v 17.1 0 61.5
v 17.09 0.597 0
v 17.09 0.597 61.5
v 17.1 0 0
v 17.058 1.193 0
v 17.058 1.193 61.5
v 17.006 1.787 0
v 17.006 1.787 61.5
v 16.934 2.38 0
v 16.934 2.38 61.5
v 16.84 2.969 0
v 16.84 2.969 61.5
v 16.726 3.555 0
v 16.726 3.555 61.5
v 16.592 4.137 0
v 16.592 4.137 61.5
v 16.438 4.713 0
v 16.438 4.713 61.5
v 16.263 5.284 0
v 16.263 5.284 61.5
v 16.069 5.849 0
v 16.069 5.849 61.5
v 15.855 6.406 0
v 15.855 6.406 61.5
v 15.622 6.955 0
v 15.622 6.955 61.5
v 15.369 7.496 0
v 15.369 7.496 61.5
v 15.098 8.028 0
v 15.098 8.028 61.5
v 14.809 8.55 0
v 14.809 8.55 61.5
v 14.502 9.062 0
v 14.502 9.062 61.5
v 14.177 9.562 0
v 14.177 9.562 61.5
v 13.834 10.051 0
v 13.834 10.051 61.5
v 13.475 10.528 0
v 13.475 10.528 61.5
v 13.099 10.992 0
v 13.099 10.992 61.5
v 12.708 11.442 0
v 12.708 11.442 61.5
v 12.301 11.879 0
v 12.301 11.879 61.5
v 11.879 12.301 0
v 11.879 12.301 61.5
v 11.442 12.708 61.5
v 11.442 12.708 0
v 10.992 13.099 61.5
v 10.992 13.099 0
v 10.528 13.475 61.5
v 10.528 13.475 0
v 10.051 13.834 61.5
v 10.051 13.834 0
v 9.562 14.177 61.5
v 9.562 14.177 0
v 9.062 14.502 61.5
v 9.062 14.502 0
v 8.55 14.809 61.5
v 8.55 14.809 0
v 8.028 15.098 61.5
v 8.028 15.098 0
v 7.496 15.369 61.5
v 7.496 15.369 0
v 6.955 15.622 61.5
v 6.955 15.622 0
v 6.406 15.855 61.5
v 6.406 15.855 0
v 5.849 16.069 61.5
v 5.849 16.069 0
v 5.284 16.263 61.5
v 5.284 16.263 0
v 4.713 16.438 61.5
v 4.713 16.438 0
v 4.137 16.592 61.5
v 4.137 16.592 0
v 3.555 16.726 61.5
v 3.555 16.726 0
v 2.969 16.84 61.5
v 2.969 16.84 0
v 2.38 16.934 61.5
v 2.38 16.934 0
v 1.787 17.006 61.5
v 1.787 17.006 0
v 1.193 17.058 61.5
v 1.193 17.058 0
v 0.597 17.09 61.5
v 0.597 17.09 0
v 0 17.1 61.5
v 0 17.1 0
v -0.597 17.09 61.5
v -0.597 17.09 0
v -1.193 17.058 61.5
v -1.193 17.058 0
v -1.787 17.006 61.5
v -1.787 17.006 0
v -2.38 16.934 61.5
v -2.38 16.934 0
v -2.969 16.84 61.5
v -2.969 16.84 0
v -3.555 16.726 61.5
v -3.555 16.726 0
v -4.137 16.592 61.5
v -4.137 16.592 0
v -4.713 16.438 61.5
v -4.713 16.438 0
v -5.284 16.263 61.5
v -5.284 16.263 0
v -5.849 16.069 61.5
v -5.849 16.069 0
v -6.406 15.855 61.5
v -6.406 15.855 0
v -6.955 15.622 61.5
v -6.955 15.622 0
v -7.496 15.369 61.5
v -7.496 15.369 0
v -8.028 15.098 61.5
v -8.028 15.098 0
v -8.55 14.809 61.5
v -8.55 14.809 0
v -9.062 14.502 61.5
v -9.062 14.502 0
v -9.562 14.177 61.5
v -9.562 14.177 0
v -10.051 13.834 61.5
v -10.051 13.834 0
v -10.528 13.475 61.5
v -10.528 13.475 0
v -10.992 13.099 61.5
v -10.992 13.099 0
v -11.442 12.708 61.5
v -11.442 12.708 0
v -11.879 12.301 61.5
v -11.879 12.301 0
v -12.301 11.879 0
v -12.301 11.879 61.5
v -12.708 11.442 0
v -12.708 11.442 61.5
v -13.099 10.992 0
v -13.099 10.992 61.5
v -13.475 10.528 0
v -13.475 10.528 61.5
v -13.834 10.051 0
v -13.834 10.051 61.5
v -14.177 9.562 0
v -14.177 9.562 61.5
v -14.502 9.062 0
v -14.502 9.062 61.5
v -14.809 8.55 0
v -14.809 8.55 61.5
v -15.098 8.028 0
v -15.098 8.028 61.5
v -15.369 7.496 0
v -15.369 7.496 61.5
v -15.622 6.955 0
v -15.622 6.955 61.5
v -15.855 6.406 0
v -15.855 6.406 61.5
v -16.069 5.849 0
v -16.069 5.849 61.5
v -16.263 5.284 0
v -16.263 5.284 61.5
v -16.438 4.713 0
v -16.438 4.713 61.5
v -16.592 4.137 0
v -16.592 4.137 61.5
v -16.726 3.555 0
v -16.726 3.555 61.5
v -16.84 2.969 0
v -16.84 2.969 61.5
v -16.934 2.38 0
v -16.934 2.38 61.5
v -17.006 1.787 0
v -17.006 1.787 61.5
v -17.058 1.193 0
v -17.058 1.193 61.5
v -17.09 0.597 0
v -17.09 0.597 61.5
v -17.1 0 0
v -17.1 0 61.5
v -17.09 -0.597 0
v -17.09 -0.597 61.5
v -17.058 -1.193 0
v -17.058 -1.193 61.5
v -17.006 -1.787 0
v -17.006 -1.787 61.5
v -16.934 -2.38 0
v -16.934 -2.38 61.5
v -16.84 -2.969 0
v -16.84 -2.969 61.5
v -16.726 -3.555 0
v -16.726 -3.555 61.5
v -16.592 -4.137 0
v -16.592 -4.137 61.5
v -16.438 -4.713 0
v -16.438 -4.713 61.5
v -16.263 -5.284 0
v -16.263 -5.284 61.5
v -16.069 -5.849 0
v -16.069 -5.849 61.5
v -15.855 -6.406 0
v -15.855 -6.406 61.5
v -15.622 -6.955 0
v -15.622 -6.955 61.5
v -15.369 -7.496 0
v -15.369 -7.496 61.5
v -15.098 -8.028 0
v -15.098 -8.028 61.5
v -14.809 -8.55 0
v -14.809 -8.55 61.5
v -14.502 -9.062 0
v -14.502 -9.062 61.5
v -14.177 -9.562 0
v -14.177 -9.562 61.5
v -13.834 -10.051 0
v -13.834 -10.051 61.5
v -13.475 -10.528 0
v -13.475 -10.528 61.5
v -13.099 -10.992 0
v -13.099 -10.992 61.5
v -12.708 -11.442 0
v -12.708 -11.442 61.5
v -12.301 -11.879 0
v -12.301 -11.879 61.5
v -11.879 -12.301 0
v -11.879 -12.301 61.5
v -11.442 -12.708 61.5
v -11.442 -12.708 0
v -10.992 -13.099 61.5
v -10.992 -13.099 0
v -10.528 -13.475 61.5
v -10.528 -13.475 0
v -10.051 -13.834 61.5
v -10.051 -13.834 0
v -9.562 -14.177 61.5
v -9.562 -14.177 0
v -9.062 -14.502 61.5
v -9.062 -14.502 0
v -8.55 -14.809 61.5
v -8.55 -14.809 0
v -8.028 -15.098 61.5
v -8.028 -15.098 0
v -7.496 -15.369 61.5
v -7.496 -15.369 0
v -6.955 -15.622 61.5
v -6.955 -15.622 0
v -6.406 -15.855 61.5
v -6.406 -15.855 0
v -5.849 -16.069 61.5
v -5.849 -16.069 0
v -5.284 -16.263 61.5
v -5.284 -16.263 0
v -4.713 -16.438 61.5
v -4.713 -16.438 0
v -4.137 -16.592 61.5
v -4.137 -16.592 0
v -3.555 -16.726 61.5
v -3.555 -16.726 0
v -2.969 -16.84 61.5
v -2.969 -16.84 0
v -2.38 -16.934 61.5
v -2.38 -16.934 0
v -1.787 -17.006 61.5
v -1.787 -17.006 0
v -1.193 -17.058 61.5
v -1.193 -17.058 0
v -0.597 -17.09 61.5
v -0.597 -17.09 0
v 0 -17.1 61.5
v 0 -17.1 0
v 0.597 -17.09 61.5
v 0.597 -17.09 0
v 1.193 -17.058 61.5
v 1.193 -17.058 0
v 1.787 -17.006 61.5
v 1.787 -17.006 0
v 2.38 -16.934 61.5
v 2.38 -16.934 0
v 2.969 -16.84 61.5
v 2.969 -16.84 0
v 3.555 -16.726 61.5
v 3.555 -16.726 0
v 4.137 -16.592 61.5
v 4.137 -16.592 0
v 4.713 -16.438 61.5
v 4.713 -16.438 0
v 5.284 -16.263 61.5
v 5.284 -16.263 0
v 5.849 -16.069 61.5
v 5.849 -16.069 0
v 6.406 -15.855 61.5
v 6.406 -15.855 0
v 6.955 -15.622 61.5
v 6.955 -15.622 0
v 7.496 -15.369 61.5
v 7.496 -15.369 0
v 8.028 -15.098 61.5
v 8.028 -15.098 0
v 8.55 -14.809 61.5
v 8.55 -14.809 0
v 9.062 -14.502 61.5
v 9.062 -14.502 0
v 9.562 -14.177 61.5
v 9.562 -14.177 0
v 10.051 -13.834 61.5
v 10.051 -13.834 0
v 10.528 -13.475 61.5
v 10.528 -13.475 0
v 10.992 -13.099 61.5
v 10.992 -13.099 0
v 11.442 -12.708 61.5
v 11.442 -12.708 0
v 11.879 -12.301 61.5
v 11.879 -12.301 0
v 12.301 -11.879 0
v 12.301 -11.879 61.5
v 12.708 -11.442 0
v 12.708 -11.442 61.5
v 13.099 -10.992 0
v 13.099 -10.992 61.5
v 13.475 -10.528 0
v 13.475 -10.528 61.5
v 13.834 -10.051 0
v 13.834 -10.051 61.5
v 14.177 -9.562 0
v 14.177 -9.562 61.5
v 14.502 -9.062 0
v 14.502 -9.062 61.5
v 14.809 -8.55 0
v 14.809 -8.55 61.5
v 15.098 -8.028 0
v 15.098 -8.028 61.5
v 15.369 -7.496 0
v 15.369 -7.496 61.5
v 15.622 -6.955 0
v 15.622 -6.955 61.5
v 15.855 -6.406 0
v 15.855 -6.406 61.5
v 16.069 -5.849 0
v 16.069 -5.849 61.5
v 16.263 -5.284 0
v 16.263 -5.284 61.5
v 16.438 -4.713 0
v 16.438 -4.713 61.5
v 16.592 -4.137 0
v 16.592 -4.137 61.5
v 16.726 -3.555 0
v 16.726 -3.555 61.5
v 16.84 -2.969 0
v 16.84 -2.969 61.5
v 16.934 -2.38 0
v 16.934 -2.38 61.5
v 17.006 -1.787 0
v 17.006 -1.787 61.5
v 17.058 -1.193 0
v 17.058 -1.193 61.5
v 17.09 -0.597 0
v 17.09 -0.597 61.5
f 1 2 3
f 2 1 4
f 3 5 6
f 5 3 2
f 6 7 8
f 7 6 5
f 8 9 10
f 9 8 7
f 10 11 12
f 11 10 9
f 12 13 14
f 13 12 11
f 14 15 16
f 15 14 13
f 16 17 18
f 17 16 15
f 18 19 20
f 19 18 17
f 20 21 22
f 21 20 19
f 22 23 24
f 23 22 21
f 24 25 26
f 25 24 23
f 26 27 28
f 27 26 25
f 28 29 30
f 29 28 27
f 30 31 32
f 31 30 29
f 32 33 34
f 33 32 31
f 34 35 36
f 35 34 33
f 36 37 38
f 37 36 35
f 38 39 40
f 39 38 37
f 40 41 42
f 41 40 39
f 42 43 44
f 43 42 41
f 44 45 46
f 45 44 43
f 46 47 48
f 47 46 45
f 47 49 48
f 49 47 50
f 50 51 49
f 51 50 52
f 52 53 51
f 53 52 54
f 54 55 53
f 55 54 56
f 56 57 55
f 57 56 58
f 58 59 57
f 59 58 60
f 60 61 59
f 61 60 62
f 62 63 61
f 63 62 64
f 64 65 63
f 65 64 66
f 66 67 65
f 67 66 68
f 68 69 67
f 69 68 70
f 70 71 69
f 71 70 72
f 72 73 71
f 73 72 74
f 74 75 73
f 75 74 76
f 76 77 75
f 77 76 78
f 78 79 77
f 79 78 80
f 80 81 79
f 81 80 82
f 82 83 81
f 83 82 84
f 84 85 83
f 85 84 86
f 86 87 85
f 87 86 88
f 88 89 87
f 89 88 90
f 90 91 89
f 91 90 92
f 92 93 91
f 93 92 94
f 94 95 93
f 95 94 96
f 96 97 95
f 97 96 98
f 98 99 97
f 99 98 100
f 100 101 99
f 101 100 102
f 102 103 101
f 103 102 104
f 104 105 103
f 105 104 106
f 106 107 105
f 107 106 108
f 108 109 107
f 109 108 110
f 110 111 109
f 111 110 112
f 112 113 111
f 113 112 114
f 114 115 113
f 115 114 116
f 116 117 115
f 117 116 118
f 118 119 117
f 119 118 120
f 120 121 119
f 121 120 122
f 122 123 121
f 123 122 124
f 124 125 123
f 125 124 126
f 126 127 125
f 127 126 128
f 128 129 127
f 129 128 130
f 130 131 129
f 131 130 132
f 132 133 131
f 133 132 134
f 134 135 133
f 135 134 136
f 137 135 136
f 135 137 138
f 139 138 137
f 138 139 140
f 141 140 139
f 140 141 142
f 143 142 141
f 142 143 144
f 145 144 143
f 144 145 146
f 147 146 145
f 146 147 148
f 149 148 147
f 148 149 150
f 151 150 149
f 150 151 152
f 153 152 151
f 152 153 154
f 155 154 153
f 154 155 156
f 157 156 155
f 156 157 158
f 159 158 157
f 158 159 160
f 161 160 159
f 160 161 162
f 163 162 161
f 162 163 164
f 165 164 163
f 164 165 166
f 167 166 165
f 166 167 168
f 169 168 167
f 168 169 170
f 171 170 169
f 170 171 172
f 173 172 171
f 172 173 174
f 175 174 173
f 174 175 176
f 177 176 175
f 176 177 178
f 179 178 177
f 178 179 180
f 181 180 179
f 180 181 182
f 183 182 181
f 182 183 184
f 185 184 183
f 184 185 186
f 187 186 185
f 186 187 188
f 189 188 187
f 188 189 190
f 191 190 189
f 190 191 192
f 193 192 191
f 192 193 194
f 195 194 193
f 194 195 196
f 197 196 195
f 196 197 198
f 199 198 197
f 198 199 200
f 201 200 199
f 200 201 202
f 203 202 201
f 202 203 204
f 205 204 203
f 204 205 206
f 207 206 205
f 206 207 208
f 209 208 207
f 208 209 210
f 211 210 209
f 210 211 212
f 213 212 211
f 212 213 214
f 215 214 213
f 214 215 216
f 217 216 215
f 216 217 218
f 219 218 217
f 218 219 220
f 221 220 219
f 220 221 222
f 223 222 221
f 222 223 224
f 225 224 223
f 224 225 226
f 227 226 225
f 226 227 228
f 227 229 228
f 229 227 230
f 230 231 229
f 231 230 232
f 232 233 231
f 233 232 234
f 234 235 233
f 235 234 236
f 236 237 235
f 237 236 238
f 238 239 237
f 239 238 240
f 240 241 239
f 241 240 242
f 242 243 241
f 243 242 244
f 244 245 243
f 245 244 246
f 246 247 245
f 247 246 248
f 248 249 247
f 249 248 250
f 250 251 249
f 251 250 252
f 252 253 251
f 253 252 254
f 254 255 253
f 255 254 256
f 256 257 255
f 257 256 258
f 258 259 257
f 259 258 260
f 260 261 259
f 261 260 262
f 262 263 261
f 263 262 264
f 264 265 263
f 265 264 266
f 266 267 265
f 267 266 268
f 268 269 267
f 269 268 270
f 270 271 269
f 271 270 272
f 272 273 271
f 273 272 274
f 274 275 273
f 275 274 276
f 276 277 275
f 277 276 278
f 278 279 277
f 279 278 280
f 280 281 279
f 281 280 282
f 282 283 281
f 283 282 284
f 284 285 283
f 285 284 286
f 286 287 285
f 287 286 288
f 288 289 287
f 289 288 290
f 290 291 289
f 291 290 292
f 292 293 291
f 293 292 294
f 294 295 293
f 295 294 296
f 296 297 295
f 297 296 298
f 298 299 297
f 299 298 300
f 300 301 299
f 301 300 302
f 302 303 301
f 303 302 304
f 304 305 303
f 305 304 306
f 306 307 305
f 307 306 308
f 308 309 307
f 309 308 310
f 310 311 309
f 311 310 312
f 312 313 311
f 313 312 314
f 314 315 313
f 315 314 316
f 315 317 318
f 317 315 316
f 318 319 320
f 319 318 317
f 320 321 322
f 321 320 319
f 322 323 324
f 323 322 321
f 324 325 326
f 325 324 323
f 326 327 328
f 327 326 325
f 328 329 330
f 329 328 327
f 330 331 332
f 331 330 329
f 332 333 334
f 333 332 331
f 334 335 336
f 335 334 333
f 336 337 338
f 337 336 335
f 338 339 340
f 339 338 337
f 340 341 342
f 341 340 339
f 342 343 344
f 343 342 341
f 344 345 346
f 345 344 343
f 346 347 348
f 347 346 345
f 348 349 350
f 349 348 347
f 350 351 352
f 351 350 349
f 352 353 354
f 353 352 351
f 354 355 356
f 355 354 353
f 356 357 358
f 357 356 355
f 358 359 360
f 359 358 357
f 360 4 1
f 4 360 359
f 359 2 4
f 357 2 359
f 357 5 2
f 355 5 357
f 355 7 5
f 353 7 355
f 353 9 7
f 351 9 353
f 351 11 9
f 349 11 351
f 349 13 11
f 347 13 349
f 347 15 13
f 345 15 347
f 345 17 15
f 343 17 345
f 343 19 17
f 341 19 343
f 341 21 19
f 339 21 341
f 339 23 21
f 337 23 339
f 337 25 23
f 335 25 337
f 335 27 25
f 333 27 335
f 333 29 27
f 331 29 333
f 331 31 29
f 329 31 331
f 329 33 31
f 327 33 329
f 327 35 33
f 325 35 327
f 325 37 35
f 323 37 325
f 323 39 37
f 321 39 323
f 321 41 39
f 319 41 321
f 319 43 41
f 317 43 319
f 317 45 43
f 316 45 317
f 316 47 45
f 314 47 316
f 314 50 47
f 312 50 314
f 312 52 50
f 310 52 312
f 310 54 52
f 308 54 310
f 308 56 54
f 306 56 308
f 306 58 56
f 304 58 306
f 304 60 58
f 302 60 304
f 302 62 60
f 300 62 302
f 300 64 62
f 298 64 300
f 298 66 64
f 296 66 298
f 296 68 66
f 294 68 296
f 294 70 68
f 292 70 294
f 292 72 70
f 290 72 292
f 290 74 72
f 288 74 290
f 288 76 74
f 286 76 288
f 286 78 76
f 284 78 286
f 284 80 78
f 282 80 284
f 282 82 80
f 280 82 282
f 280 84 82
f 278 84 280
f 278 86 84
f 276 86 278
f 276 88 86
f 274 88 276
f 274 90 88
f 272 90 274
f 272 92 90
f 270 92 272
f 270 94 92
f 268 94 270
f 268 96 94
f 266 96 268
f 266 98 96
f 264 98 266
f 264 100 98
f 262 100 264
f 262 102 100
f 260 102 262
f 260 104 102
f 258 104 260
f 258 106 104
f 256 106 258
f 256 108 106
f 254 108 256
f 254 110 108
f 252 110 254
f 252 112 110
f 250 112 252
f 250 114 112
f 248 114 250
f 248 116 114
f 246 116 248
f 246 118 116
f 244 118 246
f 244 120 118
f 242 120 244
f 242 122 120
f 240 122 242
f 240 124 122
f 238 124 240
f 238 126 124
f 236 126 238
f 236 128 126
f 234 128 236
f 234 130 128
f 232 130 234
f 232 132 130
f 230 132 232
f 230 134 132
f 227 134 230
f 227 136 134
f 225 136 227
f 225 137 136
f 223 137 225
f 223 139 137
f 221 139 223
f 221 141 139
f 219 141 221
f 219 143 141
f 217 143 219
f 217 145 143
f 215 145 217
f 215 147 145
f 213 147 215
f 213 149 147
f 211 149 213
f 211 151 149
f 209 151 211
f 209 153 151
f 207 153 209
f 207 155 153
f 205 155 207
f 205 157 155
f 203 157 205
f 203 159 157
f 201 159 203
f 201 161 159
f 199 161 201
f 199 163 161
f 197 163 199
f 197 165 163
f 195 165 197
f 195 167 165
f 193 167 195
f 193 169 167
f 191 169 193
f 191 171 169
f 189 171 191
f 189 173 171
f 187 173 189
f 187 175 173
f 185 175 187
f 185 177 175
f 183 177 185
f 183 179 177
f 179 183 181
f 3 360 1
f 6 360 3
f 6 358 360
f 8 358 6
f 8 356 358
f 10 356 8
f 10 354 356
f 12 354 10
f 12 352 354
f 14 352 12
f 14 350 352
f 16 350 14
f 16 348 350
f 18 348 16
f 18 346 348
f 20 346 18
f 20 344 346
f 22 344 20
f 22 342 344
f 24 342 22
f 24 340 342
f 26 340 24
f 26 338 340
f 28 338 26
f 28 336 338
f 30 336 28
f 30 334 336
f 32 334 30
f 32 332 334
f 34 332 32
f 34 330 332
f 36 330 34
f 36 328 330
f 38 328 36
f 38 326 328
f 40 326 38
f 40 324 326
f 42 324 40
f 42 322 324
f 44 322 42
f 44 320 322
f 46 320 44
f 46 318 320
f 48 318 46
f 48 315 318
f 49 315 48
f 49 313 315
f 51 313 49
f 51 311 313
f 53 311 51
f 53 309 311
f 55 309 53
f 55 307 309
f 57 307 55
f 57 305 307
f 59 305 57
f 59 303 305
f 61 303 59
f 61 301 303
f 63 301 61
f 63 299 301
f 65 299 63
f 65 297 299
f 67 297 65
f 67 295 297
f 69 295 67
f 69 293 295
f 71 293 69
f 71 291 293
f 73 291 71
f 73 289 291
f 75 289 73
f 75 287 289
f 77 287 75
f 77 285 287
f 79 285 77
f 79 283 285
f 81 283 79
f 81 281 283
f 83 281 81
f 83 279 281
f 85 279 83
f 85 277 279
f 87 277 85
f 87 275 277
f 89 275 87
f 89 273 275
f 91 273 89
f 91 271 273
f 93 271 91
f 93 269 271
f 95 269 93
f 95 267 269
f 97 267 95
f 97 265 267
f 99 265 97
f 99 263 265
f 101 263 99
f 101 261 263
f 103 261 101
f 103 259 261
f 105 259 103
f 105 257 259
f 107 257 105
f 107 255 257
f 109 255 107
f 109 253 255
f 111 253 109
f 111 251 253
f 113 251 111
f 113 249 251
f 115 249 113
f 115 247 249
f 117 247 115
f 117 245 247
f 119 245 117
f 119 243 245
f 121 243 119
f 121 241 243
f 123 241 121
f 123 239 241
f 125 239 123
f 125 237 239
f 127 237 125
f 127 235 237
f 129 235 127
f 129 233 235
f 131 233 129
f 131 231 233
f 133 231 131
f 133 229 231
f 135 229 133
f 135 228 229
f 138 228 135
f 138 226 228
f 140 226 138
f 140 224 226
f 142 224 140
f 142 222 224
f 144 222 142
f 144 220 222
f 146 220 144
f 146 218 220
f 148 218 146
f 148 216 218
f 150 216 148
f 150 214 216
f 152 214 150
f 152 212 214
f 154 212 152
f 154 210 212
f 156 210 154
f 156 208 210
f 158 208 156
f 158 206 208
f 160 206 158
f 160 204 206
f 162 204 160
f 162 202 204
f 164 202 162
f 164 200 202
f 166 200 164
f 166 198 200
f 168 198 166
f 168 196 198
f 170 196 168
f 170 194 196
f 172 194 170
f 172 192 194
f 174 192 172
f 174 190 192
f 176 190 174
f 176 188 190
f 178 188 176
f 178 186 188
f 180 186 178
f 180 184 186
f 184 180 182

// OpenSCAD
$fn = 180;

height = 61.5;
diameter = 34.2;

cylinder(h = height, d = diameter);
